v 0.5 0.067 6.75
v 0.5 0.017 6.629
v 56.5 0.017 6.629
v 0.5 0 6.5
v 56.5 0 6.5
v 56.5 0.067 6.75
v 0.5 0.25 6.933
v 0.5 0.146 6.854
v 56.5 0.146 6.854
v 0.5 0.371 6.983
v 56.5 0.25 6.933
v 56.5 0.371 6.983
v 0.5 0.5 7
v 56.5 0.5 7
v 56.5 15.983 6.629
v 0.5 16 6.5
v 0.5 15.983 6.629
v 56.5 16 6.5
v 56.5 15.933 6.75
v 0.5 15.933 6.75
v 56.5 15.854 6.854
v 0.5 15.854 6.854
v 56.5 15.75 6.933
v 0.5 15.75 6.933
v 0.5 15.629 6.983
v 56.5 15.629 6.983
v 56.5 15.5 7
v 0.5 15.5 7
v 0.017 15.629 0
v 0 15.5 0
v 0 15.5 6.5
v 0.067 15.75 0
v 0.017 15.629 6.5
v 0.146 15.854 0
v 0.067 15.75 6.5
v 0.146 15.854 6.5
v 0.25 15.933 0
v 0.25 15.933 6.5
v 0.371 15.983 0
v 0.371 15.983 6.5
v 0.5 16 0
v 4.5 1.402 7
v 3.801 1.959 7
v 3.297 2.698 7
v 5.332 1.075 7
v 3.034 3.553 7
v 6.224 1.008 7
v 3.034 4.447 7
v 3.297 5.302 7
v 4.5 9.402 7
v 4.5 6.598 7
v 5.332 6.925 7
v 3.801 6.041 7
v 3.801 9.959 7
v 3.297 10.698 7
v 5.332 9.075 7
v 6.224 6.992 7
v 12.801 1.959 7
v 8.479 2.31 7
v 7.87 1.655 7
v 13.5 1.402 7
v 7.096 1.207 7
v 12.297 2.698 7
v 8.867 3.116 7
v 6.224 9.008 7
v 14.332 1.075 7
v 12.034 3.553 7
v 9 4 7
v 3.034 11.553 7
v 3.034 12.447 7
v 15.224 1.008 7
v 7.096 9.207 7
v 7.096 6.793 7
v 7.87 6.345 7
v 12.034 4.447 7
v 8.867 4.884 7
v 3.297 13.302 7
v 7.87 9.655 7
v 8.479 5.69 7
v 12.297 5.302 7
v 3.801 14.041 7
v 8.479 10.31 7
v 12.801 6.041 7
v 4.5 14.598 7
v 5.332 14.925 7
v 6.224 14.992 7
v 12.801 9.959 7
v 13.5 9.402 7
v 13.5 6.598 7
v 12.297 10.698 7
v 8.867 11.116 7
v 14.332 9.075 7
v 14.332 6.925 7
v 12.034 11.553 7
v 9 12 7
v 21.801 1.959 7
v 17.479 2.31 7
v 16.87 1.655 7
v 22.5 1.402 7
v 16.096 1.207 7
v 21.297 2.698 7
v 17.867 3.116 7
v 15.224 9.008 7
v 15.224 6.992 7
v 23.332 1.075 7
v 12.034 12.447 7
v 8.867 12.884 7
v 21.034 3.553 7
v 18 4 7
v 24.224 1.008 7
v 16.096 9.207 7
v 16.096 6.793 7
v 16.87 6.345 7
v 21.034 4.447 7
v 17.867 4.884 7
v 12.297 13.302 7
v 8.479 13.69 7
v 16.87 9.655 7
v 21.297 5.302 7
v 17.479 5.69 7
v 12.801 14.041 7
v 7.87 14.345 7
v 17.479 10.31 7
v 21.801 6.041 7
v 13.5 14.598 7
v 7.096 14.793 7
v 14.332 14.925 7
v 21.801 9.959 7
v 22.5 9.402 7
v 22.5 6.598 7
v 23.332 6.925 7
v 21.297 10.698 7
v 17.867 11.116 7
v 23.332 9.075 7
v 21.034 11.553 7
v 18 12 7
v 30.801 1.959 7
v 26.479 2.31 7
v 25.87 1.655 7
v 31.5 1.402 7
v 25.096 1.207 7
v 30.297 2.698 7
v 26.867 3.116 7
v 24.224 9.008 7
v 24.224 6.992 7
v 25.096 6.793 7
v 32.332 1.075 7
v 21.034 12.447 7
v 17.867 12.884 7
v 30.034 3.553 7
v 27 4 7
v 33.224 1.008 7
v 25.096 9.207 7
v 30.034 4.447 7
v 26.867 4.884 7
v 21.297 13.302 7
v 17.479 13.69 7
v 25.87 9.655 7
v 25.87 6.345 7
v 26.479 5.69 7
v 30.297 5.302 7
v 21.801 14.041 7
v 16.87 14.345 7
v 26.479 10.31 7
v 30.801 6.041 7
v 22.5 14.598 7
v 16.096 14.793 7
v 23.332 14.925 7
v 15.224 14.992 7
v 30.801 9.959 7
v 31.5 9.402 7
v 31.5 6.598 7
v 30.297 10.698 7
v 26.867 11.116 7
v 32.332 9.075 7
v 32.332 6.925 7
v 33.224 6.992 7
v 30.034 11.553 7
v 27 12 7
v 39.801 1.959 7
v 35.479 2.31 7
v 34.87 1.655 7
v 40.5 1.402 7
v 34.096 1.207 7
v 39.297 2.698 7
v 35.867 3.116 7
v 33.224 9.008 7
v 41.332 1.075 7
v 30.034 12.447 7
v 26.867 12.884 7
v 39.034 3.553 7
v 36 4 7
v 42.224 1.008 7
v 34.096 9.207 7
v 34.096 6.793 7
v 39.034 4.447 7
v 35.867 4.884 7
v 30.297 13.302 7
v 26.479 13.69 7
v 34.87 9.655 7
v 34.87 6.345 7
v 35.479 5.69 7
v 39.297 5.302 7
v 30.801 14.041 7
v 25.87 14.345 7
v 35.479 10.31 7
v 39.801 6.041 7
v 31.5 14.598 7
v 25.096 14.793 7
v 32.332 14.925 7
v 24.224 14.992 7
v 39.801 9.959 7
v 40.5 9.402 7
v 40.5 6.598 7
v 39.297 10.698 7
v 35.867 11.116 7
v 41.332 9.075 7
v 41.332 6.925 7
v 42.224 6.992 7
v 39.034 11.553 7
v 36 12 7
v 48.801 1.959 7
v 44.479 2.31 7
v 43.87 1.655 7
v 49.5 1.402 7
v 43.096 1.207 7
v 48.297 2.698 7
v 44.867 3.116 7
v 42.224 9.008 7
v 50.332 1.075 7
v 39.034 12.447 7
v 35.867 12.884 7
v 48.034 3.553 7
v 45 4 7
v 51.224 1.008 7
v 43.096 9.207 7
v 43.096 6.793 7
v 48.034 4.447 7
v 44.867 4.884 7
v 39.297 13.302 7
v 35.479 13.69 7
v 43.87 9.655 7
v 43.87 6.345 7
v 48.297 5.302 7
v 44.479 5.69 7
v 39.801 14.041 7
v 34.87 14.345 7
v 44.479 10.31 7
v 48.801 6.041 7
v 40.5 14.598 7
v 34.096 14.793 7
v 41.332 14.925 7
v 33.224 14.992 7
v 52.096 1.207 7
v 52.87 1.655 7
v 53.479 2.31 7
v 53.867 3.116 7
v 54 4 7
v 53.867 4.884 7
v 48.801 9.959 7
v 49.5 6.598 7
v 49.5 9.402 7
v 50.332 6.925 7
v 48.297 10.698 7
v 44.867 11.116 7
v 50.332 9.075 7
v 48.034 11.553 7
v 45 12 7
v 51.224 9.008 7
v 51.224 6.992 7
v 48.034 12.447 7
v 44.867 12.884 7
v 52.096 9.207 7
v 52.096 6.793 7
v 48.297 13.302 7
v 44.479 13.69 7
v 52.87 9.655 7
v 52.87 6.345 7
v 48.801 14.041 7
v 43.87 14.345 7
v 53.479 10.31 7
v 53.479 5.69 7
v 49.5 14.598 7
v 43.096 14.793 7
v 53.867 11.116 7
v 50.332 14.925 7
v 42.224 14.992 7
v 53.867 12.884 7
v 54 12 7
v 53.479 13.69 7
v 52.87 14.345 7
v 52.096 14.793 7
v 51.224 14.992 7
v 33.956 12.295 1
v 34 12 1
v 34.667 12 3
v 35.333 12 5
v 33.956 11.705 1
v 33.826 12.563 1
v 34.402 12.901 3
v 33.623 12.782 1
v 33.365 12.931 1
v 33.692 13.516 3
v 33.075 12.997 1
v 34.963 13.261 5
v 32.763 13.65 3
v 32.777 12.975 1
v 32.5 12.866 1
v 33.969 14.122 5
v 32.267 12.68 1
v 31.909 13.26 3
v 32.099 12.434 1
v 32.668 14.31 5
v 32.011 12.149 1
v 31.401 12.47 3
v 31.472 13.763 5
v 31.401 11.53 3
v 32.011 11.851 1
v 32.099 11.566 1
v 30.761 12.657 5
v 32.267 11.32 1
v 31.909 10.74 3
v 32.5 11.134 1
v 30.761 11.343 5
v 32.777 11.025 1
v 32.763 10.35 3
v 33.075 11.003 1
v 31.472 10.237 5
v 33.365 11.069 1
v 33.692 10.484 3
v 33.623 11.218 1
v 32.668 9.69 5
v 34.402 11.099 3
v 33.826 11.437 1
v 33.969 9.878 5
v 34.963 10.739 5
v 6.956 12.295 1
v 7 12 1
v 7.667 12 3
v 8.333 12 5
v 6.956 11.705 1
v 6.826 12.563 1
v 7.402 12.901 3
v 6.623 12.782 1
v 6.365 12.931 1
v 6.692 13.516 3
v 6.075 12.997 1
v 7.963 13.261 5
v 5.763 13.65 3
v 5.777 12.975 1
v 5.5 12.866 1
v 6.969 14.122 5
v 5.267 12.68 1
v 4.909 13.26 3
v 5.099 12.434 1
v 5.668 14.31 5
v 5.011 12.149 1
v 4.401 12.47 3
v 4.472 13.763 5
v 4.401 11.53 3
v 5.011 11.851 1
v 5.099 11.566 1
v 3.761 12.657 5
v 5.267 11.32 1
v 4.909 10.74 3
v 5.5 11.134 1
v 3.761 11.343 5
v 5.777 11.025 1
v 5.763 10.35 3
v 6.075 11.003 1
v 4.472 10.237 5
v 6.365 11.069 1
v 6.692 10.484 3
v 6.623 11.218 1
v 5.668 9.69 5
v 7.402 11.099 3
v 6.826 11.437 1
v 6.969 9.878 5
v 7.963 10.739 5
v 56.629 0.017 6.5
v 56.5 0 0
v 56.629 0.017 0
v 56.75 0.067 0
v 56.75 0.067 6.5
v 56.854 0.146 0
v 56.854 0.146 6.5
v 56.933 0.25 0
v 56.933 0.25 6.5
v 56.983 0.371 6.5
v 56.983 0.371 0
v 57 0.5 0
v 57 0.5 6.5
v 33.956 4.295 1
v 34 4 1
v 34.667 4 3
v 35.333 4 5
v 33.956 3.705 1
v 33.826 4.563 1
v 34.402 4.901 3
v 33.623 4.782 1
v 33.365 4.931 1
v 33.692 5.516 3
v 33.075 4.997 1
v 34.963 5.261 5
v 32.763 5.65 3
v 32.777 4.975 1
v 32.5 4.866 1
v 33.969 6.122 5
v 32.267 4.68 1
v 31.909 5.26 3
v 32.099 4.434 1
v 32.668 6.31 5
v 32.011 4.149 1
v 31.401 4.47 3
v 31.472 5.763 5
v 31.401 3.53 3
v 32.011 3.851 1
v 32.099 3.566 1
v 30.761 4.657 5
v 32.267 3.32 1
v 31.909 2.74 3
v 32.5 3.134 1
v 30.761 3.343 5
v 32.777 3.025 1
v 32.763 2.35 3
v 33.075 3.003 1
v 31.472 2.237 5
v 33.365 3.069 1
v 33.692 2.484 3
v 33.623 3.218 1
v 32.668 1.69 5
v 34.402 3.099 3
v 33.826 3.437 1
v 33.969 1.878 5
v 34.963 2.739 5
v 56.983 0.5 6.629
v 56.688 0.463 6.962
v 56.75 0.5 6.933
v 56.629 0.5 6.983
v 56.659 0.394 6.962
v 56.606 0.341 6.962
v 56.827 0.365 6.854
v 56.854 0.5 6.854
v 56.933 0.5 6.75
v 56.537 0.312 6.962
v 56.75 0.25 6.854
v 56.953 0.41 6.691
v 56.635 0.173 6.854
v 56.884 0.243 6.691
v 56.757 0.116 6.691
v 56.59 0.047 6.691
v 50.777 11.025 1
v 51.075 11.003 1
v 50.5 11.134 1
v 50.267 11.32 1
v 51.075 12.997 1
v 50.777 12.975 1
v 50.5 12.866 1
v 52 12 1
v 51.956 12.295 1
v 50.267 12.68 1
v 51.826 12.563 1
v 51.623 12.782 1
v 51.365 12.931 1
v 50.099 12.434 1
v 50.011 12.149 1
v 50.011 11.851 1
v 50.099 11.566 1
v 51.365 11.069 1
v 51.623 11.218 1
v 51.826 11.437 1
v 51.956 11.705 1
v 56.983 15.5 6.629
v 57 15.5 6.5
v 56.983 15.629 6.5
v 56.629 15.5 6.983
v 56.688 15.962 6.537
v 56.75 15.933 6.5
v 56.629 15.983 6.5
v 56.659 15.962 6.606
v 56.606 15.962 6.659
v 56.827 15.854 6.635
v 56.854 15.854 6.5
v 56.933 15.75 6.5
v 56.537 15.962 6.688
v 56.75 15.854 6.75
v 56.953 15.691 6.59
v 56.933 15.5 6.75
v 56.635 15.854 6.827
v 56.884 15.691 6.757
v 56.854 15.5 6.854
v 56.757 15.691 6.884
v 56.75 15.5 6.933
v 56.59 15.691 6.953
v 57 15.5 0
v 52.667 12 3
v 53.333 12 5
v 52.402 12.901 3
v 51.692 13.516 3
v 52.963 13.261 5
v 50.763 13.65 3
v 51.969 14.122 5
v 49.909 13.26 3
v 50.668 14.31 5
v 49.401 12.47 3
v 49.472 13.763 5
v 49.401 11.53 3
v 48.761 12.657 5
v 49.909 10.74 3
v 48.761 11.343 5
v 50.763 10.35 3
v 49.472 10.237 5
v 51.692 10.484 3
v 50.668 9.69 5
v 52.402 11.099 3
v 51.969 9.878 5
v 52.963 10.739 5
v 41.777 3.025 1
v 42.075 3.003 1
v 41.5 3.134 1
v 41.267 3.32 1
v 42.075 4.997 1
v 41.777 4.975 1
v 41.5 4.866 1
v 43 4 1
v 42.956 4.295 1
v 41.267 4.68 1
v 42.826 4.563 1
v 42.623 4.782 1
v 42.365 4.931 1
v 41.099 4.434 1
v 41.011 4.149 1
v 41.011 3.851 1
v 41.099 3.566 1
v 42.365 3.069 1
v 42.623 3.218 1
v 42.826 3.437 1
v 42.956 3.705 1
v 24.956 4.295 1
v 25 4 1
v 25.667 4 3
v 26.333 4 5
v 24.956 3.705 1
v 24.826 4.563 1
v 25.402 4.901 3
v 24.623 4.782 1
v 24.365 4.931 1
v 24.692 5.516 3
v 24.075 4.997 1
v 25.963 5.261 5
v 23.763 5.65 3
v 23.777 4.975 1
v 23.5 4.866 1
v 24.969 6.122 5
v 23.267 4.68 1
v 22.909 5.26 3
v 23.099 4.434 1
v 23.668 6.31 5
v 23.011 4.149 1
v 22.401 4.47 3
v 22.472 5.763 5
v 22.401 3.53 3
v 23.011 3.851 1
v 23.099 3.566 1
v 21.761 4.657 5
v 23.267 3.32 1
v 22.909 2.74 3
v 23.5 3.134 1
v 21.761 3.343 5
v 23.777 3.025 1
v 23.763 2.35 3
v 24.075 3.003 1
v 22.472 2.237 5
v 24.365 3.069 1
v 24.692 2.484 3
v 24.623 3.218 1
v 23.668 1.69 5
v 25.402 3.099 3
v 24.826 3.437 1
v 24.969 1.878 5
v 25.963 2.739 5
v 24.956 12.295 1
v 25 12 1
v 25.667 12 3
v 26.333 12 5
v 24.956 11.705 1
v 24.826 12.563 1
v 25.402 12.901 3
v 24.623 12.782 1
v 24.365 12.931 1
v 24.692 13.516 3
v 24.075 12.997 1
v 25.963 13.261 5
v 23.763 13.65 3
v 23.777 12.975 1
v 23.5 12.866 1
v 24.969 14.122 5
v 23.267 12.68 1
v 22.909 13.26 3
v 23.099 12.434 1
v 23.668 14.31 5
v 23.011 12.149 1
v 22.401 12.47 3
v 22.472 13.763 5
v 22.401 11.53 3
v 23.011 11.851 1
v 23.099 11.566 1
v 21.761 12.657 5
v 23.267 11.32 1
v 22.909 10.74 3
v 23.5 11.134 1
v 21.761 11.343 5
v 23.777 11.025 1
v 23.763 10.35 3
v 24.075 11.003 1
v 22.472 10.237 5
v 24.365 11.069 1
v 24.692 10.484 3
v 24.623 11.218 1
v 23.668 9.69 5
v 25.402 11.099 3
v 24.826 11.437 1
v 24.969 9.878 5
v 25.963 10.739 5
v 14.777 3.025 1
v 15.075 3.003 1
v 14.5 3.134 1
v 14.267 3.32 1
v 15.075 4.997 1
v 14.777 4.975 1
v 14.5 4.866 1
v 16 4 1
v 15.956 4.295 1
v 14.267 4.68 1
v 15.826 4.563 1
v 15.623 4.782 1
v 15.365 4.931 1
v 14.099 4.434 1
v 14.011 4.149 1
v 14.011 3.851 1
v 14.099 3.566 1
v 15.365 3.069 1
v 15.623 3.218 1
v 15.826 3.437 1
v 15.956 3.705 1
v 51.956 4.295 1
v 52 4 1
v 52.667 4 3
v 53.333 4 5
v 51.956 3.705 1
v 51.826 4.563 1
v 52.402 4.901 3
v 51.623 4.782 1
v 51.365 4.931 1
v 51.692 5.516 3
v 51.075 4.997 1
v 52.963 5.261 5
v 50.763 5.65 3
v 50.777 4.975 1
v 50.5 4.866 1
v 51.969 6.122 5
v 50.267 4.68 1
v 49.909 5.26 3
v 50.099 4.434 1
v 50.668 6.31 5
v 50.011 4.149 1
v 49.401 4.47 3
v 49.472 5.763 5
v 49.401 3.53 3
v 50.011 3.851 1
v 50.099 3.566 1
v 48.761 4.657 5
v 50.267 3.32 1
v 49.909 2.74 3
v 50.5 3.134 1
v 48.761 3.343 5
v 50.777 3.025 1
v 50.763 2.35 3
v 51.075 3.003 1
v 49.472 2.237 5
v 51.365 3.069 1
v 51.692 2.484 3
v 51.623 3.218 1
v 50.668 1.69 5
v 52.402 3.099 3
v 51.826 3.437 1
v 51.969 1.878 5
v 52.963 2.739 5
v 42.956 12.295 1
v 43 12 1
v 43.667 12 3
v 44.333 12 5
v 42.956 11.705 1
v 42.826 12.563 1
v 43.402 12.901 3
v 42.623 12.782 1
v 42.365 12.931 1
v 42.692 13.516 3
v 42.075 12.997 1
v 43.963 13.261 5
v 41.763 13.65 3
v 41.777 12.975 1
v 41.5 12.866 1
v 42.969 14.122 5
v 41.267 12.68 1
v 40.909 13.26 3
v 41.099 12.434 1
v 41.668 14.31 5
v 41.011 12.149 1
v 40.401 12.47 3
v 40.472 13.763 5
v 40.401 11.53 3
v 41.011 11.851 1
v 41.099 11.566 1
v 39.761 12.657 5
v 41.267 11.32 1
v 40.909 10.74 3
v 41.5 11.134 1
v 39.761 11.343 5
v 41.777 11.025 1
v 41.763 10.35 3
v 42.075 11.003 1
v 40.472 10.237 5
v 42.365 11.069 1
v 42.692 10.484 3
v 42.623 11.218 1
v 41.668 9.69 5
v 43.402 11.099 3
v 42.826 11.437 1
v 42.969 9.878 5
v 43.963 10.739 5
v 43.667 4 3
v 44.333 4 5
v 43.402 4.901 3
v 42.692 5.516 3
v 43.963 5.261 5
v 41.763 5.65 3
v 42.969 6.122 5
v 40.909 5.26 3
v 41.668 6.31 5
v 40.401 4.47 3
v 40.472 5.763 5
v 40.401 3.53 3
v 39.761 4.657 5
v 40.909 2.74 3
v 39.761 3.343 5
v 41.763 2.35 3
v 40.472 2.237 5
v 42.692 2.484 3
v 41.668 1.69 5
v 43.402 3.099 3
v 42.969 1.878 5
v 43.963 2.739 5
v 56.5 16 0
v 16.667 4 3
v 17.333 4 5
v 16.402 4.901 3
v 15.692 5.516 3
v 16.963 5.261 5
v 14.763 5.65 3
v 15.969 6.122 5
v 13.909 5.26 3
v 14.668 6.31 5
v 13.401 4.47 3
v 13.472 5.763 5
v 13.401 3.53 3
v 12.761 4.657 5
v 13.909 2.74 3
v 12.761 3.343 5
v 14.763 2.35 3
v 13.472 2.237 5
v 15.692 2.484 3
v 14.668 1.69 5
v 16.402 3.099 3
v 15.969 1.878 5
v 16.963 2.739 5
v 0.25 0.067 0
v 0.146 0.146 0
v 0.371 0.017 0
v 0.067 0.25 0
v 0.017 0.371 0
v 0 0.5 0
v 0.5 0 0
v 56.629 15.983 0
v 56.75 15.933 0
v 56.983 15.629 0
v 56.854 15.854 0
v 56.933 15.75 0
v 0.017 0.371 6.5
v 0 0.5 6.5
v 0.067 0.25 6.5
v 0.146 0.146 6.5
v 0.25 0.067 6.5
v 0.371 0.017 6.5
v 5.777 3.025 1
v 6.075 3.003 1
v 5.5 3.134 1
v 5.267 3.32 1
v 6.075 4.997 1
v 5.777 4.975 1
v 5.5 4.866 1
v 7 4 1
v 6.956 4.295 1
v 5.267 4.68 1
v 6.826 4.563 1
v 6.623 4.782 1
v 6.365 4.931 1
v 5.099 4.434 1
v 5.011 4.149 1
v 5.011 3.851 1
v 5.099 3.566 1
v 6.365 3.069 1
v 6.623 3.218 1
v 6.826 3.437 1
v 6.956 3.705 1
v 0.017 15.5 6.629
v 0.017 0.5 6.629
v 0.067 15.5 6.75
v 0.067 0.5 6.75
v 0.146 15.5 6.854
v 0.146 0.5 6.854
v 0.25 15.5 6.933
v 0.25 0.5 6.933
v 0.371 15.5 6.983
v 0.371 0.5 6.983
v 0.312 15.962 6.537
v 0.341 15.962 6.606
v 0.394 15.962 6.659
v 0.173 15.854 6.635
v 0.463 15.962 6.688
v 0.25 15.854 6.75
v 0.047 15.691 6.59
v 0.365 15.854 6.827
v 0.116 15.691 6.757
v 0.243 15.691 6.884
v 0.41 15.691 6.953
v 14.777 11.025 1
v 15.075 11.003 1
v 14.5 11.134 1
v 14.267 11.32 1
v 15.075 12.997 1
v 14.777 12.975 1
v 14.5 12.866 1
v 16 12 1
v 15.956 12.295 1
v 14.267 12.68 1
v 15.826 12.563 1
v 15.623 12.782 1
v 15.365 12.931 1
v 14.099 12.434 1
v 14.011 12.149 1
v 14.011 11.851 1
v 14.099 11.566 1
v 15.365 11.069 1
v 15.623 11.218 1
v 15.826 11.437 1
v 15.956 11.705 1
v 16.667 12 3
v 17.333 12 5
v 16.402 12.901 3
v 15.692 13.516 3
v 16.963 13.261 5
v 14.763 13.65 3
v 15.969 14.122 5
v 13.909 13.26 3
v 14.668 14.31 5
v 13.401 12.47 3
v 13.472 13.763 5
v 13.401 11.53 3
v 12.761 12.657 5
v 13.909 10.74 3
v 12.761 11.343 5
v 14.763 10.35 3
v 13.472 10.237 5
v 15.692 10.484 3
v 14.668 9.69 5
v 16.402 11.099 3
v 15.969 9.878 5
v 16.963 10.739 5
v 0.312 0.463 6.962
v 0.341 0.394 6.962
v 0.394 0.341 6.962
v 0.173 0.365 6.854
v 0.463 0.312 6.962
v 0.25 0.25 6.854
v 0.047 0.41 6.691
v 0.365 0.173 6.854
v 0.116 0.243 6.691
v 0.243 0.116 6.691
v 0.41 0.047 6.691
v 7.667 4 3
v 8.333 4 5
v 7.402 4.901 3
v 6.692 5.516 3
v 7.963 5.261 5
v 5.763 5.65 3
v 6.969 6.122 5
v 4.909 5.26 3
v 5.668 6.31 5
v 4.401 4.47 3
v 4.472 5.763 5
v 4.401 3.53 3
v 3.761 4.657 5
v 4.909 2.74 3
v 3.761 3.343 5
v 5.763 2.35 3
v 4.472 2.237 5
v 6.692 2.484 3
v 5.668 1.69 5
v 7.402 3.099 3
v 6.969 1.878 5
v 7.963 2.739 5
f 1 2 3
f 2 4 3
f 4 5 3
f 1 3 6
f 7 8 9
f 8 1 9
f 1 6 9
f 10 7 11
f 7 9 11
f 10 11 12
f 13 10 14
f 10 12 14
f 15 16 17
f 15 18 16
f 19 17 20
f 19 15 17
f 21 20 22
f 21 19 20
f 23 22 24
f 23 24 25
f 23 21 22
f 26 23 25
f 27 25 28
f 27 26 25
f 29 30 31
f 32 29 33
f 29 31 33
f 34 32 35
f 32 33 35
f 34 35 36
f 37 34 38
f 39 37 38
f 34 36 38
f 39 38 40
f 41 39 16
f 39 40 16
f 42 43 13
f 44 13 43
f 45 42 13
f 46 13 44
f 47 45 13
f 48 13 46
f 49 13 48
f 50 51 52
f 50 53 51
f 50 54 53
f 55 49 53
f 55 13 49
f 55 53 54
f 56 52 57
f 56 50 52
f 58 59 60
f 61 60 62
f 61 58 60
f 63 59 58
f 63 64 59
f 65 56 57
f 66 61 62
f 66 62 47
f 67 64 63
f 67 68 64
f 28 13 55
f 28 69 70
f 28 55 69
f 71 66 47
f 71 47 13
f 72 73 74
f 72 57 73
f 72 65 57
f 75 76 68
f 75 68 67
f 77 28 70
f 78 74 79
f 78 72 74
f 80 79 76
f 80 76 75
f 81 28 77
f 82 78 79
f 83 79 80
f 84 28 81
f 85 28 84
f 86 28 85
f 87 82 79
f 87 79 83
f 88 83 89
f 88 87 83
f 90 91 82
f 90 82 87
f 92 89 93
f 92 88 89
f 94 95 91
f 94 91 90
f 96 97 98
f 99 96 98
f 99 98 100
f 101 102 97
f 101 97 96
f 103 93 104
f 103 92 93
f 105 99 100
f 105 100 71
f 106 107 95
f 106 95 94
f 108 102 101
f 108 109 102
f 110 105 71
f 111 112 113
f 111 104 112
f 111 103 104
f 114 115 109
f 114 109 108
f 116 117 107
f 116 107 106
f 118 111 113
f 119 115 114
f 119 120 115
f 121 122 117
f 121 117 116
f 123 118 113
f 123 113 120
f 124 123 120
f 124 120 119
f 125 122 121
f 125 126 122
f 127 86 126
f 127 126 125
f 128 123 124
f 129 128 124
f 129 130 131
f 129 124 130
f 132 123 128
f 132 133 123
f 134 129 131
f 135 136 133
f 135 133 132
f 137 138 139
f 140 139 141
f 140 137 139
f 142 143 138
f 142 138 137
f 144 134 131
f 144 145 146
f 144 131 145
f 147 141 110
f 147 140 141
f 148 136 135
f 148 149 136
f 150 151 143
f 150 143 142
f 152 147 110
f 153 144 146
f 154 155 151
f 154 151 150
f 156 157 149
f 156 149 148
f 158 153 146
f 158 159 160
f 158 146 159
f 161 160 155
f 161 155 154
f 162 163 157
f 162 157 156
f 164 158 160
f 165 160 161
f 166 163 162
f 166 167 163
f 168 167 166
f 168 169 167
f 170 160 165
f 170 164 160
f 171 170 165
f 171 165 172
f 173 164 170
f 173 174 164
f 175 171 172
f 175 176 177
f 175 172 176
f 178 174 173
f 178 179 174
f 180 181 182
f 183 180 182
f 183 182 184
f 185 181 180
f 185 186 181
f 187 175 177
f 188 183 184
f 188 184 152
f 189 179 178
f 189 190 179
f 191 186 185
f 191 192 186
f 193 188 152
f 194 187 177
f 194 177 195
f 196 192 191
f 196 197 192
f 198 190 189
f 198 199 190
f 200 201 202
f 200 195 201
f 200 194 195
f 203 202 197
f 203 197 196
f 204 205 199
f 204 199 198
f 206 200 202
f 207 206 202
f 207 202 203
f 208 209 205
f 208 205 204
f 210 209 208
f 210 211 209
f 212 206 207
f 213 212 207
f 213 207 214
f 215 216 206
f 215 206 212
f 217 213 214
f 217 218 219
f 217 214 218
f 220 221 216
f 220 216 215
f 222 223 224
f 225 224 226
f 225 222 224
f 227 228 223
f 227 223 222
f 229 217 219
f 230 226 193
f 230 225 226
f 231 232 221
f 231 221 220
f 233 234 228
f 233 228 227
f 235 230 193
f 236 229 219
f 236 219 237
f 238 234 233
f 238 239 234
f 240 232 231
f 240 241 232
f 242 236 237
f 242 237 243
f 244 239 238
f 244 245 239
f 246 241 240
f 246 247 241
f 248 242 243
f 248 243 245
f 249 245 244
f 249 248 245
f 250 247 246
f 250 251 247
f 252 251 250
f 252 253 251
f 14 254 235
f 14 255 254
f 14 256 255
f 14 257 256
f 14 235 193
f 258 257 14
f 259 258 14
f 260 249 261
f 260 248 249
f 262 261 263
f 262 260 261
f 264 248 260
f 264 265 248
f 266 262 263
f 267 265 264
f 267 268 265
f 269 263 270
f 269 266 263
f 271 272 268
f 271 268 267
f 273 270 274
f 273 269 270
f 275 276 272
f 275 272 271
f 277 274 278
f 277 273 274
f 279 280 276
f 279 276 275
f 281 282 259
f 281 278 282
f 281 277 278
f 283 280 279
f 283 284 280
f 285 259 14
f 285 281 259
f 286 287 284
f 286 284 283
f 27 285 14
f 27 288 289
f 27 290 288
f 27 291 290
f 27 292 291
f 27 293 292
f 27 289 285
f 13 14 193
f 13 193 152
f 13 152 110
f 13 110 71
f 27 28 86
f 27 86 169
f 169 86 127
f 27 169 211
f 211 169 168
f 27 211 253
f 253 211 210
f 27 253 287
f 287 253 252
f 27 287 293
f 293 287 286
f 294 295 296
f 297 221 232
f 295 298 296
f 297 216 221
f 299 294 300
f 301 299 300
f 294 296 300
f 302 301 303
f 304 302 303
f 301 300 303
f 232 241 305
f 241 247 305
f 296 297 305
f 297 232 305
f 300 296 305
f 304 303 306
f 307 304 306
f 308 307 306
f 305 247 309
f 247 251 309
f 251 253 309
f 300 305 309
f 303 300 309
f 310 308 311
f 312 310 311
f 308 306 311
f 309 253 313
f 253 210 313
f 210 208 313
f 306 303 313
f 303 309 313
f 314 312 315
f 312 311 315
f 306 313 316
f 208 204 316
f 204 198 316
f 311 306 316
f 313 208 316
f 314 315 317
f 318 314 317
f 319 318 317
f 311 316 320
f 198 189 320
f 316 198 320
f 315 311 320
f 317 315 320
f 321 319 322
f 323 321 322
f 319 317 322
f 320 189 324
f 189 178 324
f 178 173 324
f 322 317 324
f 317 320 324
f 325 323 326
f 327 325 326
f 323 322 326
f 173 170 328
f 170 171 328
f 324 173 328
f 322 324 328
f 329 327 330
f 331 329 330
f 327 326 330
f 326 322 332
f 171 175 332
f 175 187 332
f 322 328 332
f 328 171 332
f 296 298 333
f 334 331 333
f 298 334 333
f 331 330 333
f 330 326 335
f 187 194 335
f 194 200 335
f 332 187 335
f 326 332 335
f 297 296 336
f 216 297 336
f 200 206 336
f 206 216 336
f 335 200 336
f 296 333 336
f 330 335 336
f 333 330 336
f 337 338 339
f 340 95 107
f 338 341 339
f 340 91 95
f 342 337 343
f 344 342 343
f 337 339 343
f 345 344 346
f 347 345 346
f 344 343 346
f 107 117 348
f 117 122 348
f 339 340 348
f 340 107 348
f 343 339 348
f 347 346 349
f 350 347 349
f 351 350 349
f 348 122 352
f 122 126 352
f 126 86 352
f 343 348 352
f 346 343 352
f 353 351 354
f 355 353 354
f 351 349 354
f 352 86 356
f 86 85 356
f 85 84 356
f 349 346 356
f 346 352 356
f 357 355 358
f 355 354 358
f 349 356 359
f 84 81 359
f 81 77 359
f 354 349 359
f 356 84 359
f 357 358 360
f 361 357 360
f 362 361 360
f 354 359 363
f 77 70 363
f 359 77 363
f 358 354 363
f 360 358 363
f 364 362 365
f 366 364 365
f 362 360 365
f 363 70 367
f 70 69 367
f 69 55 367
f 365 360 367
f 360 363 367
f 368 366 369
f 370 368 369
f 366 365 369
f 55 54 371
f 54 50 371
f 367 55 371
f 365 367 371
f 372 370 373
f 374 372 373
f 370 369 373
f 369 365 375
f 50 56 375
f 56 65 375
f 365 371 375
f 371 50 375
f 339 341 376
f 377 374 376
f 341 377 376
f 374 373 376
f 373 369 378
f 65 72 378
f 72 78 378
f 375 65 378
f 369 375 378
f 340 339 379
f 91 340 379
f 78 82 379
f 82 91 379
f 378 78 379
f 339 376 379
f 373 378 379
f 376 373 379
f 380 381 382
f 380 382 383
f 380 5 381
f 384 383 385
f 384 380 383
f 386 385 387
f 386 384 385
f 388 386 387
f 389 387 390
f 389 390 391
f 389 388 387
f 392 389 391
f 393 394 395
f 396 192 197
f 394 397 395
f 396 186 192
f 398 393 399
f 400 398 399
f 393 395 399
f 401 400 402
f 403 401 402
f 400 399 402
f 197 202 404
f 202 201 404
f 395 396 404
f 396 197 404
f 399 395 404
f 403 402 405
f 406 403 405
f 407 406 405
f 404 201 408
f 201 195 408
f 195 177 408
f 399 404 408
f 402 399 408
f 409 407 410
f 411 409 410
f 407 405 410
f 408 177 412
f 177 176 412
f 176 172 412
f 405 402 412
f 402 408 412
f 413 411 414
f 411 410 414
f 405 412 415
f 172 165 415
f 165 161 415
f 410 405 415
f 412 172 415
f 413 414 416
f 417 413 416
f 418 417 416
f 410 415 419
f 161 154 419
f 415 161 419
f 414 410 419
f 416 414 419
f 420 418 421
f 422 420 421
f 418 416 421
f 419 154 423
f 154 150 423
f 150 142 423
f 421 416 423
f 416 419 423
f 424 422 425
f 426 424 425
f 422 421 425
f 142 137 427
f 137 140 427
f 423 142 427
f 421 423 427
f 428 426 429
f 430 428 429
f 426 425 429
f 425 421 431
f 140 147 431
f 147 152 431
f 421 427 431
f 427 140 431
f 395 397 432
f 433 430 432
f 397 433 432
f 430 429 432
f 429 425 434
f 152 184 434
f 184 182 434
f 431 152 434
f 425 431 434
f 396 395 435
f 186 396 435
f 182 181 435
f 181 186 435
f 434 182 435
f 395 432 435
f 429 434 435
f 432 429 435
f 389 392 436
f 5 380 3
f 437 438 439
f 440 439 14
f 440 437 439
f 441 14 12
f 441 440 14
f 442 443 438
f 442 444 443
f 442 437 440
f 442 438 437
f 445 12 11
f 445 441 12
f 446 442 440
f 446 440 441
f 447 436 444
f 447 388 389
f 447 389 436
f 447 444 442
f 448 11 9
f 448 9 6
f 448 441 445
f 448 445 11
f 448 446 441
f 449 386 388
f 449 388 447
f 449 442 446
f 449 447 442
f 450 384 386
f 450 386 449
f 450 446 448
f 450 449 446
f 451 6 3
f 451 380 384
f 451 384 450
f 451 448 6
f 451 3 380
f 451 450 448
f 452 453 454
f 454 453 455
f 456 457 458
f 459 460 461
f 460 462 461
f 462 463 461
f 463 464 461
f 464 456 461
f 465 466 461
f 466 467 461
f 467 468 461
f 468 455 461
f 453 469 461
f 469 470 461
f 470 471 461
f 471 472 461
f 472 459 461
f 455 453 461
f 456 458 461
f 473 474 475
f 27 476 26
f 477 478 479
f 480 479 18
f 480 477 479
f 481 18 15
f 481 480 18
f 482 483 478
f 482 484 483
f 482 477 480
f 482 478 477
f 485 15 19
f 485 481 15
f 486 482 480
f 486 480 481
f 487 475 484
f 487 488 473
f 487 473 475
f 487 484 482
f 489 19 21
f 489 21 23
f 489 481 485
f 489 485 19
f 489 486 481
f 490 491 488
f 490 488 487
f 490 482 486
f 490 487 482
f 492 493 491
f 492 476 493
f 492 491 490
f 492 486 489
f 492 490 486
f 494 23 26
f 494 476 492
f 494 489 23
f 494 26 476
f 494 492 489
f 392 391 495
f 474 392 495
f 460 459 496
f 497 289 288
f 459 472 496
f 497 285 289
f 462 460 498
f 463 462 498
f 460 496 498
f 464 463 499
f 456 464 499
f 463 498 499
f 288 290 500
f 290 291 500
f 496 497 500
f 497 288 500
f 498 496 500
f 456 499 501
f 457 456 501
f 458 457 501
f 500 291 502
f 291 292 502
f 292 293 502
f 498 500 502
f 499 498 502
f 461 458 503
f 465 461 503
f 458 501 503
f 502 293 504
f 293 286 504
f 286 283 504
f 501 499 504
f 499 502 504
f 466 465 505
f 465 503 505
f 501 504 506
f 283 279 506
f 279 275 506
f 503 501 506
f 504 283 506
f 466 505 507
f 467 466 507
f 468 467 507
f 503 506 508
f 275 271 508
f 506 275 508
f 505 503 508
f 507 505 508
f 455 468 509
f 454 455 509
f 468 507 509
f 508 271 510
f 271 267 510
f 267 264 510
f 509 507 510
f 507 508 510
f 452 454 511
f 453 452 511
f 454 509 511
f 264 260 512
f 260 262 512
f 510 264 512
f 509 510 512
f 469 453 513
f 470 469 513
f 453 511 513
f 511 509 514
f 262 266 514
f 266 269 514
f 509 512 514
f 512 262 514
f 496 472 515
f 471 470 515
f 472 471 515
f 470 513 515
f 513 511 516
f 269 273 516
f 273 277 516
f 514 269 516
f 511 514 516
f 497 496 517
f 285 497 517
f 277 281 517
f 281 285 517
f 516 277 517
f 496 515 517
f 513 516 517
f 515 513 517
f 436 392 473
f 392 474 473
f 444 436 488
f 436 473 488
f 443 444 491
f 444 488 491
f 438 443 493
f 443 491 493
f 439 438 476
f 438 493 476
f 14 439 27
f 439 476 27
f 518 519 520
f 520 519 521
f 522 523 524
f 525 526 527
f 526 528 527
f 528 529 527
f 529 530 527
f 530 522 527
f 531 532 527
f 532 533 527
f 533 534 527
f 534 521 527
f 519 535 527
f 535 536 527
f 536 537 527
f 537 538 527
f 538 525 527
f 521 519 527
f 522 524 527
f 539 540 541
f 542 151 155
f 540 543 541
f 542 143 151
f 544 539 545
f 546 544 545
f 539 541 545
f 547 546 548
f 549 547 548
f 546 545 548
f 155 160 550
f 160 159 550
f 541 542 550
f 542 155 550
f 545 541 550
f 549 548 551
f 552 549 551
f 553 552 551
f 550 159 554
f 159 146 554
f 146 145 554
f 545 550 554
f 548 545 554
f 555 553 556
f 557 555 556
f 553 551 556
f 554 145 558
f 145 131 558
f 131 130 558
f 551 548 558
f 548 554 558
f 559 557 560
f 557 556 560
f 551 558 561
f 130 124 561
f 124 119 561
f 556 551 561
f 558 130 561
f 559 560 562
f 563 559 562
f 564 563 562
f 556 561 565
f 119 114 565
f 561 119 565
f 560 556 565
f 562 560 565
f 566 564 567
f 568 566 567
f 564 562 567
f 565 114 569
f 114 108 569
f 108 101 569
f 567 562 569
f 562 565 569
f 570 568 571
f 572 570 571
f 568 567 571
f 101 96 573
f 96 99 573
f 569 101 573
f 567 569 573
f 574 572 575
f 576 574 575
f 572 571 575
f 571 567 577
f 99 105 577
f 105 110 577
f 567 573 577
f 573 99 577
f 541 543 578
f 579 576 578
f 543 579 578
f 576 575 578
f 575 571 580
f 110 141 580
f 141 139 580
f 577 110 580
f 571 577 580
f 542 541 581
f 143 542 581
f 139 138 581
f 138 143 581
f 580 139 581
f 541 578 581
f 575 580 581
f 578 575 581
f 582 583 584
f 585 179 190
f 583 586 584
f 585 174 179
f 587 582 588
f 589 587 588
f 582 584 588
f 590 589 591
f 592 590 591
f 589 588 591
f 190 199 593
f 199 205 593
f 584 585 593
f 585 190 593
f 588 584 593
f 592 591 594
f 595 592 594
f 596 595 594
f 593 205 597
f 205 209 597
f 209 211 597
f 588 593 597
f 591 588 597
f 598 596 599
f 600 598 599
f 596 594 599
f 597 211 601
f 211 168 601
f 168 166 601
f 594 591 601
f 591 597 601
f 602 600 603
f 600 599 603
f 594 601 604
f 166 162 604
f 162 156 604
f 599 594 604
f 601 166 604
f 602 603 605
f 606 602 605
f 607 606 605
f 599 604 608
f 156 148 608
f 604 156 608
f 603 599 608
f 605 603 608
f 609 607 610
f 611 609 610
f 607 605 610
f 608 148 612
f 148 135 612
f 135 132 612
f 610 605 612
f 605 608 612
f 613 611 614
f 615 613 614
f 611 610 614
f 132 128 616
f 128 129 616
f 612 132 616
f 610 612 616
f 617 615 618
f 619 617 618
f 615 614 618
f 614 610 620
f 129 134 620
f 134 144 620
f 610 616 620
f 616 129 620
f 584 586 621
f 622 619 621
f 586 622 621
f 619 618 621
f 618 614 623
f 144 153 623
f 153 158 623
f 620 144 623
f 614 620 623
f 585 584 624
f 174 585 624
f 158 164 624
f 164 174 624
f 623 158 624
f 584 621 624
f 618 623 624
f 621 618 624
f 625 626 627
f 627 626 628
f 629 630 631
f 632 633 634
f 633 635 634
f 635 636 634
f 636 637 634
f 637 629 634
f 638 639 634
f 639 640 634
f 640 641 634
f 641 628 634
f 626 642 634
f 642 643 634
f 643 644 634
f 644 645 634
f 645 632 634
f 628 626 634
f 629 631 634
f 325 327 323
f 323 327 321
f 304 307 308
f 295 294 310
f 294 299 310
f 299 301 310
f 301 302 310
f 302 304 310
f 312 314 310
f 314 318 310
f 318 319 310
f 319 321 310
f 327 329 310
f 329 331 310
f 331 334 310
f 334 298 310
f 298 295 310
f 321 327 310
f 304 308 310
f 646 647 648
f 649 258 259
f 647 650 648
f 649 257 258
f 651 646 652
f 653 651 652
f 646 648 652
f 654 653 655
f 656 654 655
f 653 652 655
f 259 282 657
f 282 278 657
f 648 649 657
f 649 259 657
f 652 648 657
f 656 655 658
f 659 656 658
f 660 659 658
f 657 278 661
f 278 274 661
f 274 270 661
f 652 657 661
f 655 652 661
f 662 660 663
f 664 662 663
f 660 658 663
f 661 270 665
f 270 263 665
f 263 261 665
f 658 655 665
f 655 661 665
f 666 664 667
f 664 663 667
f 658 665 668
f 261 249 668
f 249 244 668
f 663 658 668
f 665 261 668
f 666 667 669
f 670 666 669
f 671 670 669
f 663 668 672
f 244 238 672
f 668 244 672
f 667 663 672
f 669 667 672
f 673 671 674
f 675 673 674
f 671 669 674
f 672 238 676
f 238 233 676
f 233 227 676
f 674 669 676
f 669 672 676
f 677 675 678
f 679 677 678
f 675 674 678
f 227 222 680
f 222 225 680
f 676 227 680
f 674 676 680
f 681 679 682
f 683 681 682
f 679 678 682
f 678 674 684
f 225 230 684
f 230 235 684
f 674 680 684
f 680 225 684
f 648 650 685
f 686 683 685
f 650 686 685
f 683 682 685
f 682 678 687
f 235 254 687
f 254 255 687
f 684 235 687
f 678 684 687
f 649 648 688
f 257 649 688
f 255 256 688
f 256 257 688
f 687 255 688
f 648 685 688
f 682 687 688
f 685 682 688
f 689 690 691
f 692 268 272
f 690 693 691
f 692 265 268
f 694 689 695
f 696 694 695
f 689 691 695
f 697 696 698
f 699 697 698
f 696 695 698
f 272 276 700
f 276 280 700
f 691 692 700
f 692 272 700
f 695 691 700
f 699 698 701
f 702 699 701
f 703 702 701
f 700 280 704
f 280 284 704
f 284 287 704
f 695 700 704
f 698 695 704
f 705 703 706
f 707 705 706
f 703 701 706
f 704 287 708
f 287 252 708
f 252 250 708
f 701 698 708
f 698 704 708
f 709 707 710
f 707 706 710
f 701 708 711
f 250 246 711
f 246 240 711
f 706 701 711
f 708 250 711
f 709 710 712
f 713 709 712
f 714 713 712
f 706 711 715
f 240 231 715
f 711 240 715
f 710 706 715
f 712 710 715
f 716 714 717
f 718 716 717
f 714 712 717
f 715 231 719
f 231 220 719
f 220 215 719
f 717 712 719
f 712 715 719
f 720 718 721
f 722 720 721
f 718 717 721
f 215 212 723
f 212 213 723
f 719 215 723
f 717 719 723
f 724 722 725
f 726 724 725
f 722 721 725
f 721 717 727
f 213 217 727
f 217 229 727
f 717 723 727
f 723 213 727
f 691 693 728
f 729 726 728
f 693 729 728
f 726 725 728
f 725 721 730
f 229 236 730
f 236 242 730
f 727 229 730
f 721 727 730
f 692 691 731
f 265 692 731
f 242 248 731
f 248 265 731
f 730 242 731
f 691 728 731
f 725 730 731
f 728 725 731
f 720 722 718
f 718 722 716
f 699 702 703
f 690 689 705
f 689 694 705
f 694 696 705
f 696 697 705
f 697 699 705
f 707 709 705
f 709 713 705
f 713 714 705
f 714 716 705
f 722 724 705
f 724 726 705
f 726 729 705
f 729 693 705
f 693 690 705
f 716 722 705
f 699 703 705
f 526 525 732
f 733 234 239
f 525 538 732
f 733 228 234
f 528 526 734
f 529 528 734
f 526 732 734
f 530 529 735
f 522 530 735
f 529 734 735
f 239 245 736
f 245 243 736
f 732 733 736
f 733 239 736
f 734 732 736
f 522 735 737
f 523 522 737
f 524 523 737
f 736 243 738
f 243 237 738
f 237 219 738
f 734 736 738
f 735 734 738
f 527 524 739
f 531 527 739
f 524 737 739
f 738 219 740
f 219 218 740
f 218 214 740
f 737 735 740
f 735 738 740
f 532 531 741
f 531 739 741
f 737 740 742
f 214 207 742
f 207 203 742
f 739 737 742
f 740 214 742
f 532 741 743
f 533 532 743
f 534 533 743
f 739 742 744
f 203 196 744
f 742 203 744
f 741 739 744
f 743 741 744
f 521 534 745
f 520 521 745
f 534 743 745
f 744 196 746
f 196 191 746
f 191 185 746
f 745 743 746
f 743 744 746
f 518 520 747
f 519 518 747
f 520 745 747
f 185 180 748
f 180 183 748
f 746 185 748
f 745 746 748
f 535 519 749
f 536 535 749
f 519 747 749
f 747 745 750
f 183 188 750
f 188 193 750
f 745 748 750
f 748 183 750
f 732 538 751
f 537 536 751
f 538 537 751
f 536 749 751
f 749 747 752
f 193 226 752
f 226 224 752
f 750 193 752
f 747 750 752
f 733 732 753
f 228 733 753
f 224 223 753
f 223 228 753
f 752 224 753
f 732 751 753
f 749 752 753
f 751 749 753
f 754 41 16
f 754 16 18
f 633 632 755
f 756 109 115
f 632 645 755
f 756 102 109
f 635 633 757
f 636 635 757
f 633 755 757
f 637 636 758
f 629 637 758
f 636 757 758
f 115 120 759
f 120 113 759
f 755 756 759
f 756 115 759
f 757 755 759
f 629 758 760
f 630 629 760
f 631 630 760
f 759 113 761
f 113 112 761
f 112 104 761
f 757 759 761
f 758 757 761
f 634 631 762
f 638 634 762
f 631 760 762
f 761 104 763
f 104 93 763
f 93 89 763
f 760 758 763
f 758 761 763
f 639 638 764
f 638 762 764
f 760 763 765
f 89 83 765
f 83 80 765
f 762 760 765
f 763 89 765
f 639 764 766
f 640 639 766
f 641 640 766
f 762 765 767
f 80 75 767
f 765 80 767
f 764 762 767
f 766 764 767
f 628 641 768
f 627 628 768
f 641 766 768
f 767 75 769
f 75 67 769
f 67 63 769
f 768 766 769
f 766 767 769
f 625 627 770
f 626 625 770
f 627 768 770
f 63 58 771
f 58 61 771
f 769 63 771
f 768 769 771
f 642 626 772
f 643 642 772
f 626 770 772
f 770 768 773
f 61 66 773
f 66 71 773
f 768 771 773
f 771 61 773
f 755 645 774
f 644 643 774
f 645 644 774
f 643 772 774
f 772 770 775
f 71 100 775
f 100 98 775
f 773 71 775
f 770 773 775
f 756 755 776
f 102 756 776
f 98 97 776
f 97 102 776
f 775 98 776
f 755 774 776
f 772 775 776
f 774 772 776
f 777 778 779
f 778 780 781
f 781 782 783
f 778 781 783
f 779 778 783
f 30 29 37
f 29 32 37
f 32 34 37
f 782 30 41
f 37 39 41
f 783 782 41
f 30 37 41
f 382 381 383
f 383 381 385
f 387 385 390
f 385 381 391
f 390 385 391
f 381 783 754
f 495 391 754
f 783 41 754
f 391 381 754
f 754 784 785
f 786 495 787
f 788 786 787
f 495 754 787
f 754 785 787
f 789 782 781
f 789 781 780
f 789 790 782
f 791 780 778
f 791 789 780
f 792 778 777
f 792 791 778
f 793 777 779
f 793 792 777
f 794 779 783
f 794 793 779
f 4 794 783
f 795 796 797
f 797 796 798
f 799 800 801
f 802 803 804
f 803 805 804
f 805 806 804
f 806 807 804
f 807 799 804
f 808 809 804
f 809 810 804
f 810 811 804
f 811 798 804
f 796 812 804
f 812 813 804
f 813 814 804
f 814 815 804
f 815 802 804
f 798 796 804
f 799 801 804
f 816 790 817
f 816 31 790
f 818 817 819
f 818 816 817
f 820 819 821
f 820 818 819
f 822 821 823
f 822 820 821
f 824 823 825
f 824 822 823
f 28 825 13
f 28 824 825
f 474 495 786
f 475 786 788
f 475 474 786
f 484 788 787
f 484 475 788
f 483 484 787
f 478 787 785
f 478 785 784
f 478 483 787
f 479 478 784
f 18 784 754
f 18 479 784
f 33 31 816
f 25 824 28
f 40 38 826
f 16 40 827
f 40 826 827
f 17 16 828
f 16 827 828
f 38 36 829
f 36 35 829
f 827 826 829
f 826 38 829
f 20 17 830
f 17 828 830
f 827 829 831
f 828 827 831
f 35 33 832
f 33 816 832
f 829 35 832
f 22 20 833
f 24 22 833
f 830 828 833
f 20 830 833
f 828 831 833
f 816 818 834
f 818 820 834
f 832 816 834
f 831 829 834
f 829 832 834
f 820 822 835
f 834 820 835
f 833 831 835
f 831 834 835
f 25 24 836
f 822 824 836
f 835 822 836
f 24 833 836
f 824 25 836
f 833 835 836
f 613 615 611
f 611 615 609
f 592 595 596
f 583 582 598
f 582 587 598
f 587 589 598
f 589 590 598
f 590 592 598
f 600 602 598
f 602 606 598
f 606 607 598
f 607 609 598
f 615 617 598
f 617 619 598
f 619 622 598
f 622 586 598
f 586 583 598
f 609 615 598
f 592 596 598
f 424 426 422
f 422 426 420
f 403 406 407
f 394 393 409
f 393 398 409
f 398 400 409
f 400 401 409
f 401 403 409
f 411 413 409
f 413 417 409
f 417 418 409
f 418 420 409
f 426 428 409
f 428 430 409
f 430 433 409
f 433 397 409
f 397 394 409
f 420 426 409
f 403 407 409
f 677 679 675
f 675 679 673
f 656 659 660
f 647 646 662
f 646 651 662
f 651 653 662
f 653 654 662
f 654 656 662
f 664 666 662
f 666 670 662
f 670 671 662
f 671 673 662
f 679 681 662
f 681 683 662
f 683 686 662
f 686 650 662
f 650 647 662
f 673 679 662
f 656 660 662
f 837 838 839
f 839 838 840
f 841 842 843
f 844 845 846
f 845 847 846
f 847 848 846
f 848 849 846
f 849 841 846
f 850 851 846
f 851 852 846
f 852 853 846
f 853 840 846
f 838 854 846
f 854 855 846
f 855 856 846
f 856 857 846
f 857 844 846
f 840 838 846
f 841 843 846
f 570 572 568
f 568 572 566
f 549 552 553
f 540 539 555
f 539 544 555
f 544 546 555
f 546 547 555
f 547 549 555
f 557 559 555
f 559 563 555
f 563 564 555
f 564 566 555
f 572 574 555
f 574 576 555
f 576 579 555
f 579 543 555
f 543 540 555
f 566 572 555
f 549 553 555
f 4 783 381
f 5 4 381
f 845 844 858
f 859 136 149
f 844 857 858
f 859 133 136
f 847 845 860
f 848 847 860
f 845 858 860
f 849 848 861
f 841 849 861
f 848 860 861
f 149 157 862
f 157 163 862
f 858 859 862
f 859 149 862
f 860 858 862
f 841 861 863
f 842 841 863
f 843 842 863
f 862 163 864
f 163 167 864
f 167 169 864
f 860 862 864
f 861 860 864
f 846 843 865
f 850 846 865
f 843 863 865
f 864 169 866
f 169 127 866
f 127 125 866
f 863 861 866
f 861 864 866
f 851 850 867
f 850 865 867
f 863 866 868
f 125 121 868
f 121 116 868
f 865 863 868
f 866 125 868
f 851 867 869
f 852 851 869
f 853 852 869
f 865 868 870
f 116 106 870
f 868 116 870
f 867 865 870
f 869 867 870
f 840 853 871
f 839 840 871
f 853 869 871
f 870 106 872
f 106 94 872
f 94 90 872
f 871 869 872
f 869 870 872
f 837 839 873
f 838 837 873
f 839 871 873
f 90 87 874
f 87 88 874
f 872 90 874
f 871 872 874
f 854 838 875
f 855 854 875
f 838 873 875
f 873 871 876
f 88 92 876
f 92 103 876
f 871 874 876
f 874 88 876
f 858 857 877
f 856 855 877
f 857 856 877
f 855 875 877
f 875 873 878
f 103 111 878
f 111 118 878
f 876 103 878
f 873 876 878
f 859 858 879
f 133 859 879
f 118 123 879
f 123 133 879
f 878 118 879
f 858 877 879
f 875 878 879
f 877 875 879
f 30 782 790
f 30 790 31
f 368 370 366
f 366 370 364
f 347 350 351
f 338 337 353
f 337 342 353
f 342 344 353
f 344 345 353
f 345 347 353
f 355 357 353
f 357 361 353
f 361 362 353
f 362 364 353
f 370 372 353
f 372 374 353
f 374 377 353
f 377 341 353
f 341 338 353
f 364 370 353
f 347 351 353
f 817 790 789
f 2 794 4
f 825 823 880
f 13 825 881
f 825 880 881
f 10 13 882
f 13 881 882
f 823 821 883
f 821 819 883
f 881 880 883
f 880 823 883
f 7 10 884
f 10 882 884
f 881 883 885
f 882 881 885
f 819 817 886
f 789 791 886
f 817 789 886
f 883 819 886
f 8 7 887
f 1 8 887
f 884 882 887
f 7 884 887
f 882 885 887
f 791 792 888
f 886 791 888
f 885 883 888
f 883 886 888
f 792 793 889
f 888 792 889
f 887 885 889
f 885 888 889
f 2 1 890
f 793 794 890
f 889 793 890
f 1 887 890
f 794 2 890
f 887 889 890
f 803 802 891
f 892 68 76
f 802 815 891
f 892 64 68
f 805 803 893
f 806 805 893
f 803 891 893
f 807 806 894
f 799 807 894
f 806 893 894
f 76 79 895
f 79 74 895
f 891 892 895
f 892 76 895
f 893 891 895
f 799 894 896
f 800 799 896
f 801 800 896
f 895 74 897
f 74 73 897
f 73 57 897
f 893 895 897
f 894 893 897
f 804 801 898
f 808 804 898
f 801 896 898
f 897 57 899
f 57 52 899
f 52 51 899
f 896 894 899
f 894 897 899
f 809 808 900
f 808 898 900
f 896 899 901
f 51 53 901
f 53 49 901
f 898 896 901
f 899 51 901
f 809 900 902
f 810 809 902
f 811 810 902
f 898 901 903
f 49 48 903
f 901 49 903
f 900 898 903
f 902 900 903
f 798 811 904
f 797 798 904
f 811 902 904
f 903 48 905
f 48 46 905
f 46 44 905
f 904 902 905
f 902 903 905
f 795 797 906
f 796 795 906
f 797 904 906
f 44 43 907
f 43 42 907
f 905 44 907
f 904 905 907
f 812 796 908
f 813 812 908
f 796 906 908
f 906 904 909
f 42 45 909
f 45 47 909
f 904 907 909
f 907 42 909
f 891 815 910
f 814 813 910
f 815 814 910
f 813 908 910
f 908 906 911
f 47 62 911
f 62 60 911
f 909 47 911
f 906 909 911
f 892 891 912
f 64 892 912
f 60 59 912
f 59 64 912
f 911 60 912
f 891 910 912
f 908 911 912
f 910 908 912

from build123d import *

# Parameters (mm, degrees)
ARRAY_X_COUNT = 6
ARRAY_X_PITCH = 9
ARRAY_Y_COUNT = 2
ARRAY_Y_PITCH = 8
BOX_W         = 57
BOX_H         = 16
BOX_DEPTH     = 7
FILLET_R      = 0.5


with BuildPart() as array:
    # Cone → Cone (revolve)
    with BuildSketch(Plane(origin=(6, 4, 1), x_dir=(1, 0, 0), z_dir=(0, -1, 0))):
        Polygon((0, 0), (1, 0), (3, 6), (0, 6), align=None)
    revolve(axis=Axis((6, 4, 1), (0, 0, 1)))

    # Array X: Array ×6


with BuildPart() as array_1:
    add(array.part)
    with Locations(*[(i * ARRAY_X_PITCH, 0, 0) for i in range(1, ARRAY_X_COUNT)]):
        add(array.part)

    # Array Y: Array ×2


with BuildPart() as array_2:
    add(array_1.part)
    with Locations(*[(0, i * ARRAY_Y_PITCH, 0) for i in range(1, ARRAY_Y_COUNT)]):
        add(array_1.part)


with BuildPart() as ouera:
    # Box → Box (new body)
    with BuildSketch(Plane.XY):
        with Locations((28.5, 8)):
            Rectangle(BOX_W, BOX_H)
    extrude(amount=BOX_DEPTH)

    # Fillet
    fillet_edges = [ouera.edges().sort_by_distance(p)[0] for p in [
        (0, 0, 3.5),
        (0, 8, 7),
        (0, 16, 3.5),
        (57, 0, 3.5),
        (57, 8, 7),
        (57, 16, 3.5),
        (28.5, 0, 7),
        (28.5, 16, 7),
    ]]
    fillet(fillet_edges, radius=FILLET_R)

    # Cut: cut Array
    add(array_2.part, mode=Mode.SUBTRACT)


solid = ouera.part
